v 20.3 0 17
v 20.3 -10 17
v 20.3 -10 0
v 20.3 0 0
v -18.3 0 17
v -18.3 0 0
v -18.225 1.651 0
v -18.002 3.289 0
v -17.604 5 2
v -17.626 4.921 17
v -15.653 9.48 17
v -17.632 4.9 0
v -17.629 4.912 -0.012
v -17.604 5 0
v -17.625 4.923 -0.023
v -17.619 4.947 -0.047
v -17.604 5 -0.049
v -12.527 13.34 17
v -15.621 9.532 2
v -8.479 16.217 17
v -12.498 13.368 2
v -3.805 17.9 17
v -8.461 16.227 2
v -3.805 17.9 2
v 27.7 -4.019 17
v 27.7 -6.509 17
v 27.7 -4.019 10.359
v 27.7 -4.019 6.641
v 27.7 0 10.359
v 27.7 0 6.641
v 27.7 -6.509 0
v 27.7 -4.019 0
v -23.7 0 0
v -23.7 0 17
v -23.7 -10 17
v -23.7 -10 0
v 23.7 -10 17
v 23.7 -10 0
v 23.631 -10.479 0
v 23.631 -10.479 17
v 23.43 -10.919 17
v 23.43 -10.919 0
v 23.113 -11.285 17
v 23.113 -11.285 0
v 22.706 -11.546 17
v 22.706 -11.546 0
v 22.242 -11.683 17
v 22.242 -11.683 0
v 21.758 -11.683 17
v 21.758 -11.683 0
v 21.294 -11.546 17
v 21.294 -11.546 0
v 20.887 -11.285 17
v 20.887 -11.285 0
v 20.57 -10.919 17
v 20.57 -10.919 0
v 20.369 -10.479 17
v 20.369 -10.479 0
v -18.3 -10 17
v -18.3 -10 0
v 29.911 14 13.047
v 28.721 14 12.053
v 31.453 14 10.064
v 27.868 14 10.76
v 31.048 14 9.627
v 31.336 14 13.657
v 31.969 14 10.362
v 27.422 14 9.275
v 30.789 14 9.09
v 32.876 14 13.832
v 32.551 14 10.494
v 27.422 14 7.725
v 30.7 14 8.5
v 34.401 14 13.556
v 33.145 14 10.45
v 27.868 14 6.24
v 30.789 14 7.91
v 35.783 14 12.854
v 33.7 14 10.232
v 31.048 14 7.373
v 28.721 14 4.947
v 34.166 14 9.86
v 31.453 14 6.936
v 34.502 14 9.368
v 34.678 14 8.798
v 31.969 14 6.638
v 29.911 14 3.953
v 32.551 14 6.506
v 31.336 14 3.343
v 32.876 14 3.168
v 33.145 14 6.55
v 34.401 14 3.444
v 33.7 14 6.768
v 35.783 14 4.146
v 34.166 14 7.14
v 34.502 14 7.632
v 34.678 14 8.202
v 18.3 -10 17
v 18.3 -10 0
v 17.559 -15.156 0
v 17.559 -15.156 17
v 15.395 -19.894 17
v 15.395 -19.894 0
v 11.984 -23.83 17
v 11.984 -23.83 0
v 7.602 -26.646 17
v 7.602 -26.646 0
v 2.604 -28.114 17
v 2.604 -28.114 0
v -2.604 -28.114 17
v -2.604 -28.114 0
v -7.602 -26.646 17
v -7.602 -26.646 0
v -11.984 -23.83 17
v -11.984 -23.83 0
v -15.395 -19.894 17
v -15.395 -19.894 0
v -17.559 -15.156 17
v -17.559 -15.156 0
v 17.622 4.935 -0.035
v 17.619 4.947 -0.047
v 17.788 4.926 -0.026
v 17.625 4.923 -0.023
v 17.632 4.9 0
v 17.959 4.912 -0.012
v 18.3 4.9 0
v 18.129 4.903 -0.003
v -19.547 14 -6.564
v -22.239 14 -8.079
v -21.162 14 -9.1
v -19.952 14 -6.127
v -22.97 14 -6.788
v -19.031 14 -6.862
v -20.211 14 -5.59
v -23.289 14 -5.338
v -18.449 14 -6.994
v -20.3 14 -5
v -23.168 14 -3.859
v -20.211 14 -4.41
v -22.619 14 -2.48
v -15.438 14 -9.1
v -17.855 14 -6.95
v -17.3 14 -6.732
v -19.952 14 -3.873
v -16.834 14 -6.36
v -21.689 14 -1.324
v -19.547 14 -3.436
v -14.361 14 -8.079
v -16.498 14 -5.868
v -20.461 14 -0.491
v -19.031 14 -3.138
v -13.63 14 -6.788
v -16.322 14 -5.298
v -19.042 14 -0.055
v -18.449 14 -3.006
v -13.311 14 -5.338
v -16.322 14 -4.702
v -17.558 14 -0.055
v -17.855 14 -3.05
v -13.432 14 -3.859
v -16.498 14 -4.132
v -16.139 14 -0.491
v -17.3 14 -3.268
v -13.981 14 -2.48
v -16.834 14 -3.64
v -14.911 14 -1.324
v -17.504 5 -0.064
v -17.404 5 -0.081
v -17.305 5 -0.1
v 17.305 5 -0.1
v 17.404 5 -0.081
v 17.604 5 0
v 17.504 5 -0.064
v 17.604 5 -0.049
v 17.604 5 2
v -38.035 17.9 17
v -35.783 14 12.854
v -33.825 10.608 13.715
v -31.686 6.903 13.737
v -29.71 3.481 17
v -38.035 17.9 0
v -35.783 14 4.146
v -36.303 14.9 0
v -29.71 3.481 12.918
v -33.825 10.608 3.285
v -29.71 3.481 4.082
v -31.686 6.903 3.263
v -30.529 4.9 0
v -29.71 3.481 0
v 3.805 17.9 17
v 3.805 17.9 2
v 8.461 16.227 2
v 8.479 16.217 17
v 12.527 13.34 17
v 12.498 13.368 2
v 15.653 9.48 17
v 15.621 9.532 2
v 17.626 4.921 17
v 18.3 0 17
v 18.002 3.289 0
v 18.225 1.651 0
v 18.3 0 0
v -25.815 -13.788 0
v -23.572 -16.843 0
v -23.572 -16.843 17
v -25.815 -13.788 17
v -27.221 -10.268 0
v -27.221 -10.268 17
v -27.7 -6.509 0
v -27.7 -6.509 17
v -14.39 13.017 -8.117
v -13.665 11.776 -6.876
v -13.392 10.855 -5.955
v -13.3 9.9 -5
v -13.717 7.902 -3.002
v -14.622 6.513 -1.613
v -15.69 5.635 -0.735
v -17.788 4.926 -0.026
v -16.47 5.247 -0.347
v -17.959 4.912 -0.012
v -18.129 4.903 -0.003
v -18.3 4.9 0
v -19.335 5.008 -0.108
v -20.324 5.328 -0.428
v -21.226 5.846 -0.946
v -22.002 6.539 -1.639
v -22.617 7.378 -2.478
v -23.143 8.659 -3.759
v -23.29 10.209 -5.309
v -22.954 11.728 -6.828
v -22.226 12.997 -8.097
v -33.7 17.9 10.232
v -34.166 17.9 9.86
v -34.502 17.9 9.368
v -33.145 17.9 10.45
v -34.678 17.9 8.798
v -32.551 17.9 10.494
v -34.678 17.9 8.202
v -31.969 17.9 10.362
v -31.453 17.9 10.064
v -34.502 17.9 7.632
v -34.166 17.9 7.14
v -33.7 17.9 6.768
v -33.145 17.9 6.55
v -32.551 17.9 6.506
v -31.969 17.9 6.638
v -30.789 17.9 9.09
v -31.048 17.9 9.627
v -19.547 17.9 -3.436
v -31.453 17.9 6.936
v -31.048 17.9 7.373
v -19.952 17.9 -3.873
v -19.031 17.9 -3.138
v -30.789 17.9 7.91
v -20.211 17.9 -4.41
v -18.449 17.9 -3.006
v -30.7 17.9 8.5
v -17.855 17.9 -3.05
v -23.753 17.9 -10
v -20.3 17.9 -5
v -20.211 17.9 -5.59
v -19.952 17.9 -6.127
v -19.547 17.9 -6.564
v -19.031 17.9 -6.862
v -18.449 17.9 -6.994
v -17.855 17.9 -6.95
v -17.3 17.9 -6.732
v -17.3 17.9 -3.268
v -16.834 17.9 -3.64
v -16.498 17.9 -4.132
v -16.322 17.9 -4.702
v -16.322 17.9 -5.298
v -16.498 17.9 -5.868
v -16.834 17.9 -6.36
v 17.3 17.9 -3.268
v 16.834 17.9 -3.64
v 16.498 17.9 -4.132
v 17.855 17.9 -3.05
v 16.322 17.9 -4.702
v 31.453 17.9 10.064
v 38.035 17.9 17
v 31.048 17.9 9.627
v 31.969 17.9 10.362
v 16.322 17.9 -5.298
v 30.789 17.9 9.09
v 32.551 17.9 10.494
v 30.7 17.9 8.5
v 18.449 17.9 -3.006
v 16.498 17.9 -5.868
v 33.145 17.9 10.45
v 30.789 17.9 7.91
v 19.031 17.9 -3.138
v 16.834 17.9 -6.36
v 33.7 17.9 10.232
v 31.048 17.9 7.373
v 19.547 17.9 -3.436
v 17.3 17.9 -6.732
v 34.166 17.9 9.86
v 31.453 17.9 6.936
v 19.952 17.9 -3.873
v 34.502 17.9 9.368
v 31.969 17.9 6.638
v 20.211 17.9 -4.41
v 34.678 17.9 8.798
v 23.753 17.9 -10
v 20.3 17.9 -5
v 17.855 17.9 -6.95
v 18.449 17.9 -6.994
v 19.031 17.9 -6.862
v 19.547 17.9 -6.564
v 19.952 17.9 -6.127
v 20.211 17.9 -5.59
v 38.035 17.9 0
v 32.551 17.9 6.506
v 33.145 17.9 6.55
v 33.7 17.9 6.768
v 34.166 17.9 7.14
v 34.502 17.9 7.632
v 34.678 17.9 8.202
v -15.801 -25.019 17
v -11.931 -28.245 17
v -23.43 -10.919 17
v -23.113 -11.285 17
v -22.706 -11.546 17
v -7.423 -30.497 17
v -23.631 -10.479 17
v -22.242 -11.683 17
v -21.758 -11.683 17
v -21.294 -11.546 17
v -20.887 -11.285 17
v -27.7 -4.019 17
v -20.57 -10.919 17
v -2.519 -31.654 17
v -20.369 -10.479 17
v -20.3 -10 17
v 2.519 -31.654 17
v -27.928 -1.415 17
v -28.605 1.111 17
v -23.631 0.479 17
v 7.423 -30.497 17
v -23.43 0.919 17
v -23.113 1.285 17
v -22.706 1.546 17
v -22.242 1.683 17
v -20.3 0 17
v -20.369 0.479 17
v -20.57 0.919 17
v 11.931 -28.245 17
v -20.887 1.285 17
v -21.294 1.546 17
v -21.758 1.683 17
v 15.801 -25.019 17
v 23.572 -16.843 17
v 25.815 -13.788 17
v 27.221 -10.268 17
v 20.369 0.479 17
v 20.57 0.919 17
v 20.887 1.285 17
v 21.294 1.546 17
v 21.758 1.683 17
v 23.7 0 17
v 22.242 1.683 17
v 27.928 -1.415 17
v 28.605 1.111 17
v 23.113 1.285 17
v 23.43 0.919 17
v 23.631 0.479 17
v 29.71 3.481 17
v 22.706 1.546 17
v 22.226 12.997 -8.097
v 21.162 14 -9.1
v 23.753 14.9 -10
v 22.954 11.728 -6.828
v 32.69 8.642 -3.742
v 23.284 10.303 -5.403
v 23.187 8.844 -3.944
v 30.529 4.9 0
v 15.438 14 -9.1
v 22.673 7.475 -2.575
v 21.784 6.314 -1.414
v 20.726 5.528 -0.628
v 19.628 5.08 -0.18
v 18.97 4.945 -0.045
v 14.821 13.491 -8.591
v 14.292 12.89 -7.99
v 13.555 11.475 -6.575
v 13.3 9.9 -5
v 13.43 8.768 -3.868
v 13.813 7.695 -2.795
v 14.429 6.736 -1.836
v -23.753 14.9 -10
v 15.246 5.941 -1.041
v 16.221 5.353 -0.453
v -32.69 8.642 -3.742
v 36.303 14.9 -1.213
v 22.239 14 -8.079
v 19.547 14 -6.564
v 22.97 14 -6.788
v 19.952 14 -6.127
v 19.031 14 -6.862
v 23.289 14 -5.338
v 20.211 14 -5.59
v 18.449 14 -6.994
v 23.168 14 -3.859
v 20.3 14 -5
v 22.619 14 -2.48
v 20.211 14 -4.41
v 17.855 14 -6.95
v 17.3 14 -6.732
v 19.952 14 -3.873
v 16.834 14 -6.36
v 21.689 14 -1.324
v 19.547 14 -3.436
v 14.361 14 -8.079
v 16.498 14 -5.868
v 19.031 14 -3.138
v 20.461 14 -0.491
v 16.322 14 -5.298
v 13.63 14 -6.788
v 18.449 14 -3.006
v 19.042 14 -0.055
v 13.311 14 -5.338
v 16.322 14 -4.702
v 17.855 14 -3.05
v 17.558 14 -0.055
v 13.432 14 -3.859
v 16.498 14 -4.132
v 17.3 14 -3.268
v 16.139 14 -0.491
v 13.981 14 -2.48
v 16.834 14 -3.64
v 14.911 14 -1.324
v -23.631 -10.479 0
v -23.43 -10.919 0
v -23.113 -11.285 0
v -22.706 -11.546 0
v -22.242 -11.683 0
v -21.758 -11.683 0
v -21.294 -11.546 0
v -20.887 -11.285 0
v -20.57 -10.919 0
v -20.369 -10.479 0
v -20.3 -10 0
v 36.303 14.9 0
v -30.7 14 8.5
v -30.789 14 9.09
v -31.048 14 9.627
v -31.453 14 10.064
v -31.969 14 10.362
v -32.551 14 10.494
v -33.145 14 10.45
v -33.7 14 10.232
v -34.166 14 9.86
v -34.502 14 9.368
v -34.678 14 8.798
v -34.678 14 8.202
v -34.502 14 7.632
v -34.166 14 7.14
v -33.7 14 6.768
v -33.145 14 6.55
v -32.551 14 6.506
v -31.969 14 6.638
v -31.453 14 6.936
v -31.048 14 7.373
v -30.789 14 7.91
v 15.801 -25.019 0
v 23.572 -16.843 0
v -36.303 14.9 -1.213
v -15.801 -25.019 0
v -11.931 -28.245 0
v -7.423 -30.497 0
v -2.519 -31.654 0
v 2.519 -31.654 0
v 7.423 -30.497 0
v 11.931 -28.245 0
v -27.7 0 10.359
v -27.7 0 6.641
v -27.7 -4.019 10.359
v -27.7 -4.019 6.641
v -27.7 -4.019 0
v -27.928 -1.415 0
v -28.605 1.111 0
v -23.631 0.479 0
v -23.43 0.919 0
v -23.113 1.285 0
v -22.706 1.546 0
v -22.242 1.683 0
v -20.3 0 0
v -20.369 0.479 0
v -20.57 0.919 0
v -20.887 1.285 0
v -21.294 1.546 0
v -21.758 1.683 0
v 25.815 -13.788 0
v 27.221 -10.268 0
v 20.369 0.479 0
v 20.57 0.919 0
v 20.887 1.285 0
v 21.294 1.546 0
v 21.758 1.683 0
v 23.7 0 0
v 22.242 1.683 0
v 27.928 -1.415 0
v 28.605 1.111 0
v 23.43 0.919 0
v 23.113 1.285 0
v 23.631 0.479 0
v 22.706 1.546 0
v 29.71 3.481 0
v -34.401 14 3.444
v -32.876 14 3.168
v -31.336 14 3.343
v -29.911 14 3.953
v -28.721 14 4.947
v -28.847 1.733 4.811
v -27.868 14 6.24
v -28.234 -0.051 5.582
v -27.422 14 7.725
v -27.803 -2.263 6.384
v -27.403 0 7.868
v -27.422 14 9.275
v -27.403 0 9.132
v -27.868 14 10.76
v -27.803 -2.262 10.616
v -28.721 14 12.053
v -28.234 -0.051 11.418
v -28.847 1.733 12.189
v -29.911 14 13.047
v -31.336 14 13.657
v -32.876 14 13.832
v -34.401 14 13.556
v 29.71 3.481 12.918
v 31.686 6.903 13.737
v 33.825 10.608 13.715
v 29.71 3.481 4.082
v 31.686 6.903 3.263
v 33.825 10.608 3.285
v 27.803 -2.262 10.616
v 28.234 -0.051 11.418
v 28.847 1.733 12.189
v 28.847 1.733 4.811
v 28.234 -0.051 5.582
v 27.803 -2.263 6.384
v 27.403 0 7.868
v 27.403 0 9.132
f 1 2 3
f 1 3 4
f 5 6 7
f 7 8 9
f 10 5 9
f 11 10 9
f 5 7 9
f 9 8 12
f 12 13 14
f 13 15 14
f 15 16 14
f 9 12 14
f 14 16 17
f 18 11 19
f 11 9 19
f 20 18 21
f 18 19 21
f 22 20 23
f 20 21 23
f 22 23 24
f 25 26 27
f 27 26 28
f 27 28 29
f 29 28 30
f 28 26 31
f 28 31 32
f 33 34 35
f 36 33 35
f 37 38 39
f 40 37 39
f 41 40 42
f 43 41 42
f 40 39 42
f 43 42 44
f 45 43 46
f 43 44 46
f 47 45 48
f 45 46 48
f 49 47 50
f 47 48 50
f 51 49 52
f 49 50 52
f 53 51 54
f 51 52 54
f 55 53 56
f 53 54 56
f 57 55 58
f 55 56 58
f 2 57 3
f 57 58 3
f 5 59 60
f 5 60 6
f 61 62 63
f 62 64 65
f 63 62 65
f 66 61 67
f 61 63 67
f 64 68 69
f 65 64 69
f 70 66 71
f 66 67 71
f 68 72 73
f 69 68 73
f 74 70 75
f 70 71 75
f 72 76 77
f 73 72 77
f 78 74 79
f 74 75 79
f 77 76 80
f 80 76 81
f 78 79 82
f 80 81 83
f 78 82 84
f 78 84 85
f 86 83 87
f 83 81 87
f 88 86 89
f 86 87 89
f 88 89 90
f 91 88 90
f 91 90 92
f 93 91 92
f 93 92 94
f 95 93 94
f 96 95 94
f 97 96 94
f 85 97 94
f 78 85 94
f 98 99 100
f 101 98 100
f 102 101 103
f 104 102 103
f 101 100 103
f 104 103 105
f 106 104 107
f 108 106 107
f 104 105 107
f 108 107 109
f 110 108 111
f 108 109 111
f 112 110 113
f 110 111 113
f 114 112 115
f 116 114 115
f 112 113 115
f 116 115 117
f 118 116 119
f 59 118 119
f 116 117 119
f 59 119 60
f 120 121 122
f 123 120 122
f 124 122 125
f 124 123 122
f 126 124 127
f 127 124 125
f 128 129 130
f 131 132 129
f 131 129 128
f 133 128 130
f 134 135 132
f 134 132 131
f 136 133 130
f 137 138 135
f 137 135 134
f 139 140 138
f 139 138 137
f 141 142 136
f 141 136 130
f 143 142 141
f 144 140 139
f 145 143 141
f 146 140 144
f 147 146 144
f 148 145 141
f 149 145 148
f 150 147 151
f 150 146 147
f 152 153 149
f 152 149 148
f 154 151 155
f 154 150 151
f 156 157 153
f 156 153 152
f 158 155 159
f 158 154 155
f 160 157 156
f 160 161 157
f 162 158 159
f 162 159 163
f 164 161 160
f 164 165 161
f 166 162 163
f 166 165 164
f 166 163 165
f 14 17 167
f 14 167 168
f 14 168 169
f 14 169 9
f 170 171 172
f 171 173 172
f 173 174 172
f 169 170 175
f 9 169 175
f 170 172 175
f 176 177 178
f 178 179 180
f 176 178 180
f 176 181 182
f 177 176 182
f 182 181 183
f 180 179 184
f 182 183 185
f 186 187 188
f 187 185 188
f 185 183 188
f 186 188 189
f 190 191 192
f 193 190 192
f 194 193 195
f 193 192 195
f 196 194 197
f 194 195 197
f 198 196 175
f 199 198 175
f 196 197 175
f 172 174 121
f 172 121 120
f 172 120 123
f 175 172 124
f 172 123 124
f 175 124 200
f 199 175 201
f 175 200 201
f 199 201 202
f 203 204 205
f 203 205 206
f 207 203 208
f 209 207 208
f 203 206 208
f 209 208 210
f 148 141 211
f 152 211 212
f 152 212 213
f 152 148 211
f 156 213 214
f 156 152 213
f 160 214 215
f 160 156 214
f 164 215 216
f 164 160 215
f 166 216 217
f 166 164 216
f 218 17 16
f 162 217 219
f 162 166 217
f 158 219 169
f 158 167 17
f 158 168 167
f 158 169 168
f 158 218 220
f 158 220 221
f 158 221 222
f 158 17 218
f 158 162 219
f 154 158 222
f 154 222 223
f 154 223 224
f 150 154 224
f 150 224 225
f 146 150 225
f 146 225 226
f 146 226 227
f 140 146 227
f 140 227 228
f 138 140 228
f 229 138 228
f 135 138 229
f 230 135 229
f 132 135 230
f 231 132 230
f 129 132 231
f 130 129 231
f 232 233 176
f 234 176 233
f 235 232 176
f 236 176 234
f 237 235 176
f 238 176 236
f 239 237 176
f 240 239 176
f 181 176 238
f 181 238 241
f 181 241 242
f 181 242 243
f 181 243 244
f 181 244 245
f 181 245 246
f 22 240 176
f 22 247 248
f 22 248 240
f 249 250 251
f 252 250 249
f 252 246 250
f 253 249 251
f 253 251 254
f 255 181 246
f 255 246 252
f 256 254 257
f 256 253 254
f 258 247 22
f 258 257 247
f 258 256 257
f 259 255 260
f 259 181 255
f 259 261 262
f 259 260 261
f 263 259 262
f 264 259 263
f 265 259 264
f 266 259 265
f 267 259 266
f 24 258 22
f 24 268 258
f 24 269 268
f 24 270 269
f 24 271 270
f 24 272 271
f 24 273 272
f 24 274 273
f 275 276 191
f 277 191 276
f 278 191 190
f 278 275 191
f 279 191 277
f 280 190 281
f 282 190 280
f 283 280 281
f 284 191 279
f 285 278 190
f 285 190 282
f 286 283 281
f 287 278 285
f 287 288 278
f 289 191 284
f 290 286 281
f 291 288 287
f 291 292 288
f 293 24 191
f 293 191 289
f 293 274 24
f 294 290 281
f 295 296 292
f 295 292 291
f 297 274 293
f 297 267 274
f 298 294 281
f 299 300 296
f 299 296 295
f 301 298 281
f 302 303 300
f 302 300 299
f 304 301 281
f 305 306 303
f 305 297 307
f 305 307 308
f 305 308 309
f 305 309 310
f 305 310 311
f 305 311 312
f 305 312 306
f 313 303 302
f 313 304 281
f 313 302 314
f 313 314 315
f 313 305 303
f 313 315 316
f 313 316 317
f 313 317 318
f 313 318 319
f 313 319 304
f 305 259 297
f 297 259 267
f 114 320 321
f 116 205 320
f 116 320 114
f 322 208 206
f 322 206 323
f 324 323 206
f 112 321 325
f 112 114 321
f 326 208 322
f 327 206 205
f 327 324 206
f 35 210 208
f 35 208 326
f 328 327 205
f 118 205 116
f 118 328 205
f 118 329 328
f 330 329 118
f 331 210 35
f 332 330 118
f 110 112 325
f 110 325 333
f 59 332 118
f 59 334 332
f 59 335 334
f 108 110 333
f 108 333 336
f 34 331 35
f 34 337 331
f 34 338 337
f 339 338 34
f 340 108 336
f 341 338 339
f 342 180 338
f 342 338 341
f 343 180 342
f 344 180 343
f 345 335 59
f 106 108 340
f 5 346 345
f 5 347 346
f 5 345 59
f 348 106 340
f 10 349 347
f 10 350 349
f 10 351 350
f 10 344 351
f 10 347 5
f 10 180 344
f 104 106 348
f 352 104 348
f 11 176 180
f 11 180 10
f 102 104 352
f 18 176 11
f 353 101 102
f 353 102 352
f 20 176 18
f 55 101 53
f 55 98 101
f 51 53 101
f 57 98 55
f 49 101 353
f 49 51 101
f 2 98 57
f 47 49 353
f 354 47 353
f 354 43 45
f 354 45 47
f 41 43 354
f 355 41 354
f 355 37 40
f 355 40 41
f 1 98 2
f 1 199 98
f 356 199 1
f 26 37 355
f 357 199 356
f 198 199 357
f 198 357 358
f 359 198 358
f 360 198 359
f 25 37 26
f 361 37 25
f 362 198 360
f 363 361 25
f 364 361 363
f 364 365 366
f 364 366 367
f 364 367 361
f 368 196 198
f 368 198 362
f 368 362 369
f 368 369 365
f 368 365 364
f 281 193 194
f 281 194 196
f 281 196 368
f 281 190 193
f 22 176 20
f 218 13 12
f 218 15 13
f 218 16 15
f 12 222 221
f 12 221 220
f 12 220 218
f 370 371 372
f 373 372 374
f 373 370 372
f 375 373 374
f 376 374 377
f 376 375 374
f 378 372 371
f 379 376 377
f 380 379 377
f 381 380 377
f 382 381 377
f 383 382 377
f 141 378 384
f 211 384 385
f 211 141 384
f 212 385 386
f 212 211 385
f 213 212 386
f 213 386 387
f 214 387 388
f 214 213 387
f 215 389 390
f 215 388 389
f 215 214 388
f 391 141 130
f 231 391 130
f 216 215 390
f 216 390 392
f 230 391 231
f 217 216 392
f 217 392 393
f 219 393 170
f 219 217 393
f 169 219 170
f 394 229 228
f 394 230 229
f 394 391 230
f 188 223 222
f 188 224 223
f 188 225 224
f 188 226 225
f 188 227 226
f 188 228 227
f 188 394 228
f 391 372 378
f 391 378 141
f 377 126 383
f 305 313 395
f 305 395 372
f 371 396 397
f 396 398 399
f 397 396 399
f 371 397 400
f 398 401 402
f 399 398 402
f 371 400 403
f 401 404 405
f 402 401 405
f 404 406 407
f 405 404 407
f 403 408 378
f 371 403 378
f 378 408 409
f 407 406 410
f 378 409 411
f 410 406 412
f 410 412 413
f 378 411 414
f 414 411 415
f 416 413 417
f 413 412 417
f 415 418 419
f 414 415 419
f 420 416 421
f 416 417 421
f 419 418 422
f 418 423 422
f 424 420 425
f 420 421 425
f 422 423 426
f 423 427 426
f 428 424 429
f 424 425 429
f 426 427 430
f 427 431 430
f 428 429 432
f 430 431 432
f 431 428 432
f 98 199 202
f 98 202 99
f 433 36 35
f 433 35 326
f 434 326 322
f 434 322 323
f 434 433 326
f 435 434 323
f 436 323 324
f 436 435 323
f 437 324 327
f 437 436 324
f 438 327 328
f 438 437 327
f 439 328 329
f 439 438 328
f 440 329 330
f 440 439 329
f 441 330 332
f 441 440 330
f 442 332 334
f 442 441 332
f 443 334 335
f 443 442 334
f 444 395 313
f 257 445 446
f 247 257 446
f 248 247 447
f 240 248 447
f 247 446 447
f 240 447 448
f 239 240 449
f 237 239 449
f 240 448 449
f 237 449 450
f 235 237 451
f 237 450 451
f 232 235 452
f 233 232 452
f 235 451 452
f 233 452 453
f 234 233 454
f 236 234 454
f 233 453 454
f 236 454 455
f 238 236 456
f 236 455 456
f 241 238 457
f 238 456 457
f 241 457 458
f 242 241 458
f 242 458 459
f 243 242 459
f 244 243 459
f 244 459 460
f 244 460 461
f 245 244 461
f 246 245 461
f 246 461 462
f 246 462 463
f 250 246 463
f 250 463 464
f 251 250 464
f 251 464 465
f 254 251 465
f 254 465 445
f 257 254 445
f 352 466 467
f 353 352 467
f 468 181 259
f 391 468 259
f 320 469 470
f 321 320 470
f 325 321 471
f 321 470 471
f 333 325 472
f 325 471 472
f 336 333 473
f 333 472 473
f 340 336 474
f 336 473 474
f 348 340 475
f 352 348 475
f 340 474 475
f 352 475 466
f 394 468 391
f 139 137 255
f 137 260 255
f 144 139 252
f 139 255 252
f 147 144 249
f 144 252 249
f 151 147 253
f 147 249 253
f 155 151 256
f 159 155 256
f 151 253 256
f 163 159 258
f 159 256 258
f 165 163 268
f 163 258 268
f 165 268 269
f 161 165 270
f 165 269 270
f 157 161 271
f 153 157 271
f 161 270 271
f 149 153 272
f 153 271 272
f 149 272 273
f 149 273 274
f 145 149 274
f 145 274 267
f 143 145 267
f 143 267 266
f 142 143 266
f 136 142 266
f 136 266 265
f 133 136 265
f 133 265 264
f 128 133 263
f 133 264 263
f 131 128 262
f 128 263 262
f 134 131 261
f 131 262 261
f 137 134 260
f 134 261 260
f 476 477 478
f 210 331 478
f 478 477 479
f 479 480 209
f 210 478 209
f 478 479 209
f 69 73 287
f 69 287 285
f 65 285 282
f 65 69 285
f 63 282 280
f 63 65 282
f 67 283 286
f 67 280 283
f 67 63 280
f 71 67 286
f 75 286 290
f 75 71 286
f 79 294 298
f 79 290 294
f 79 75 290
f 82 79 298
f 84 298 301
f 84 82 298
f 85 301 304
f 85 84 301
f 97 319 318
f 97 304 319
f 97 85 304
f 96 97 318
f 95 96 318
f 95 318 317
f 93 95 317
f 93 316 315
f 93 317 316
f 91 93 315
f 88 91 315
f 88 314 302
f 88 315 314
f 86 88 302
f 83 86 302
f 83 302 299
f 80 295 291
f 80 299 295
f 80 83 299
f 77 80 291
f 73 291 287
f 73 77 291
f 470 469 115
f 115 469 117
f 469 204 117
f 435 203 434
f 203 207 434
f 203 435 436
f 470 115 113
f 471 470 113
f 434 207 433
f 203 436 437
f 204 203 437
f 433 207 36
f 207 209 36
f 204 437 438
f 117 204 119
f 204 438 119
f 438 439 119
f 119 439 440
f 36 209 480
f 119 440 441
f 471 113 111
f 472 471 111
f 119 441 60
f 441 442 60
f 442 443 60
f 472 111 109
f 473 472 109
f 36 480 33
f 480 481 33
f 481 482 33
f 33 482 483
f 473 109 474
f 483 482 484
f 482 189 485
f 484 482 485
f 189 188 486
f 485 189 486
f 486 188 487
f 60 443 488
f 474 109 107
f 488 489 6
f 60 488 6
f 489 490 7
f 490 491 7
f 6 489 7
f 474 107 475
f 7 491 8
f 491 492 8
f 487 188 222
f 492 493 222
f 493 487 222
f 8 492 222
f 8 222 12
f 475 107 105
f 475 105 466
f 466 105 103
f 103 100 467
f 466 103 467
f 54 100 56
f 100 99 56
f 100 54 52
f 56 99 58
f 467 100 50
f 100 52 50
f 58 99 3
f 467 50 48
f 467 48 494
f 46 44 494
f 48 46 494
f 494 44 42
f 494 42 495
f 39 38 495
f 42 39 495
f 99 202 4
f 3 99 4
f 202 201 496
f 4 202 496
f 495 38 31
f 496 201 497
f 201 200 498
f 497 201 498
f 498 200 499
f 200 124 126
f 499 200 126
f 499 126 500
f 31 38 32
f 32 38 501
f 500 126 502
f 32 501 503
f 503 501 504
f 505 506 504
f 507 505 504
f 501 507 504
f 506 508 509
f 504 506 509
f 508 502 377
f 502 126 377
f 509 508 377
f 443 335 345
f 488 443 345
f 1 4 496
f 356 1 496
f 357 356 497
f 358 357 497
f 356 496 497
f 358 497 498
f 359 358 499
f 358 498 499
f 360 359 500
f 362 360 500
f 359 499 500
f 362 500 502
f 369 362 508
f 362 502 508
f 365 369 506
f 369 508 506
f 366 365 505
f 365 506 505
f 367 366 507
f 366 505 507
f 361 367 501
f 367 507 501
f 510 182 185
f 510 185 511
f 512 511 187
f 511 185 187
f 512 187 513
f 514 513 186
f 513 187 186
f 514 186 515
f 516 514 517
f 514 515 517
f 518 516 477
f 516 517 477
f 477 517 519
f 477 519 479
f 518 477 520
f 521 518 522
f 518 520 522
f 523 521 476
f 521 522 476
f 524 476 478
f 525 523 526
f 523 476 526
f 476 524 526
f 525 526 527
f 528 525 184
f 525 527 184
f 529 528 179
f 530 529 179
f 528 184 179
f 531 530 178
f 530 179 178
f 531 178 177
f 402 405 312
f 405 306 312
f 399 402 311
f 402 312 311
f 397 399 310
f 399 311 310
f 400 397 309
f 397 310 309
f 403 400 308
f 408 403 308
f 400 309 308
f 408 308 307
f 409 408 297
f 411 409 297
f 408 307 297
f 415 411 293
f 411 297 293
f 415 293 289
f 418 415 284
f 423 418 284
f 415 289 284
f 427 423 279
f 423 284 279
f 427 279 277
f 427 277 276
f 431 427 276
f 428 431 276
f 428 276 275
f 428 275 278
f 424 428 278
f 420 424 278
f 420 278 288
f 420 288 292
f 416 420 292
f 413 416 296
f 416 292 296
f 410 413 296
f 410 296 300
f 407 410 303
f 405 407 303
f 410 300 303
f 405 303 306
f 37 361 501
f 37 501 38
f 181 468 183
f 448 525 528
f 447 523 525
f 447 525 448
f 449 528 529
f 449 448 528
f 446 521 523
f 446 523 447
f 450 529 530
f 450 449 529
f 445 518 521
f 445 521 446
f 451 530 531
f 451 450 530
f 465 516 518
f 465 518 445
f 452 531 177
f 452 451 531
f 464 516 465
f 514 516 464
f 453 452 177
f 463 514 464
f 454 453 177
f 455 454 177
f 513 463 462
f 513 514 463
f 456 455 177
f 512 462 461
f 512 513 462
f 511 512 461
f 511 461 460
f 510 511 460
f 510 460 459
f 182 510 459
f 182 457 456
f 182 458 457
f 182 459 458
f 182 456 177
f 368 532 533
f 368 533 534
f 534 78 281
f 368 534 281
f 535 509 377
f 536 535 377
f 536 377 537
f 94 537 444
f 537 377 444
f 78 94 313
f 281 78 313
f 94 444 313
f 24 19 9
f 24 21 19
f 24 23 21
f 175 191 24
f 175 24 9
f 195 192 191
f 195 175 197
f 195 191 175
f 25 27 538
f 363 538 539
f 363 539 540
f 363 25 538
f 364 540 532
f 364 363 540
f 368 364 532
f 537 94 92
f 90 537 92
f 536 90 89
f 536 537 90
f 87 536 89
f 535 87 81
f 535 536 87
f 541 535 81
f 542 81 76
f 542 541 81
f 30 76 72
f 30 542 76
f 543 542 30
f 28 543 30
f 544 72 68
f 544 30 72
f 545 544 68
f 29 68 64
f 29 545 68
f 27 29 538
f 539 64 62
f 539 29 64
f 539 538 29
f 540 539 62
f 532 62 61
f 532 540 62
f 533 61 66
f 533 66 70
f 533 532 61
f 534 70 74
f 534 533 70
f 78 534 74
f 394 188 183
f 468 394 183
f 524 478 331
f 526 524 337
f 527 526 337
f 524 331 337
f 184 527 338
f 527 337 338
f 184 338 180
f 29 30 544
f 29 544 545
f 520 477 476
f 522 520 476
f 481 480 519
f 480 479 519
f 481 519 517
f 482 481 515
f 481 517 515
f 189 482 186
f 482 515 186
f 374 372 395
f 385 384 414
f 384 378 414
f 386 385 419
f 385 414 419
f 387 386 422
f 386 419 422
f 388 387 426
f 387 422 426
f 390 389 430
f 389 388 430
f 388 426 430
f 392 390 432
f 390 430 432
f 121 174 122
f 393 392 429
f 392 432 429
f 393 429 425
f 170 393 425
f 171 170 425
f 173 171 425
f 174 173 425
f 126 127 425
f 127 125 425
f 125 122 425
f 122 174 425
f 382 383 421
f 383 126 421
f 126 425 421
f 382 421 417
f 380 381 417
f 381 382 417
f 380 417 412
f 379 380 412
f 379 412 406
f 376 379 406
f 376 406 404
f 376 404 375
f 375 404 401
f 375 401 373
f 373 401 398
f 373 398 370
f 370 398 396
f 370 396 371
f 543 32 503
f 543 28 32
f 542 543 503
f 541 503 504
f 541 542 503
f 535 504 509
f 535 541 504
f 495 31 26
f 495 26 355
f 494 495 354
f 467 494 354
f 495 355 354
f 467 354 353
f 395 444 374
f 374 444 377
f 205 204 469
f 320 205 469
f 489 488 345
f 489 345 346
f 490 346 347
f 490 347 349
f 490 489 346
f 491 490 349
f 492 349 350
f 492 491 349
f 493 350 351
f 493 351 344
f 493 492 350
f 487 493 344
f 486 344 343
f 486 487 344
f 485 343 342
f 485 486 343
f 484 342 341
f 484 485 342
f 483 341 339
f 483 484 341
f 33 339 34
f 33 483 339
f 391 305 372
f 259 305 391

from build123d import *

# Parameters (mm, degrees)
BOSS_EXTRUDE1_DEPTH = 17
BOSS_EXTRUDE2_START = -17
BOSS_EXTRUDE2_DEPTH = 2
SKETCH3_R           = 2
CUT_EXTRUDE2_DEPTH  = 53.410576235
SKETCH4_R           = 5.334569818
CUT_EXTRUDE3_DEPTH  = 14
SKETCH5_R           = 2
BOSS_EXTRUDE3_DEPTH = 3
CUT_EXTRUDE4_DEPTH  = 57.452356029
CHAMFER2_SIZE       = 10
FILLET1_R           = 15
FILLET2_R           = 15
SKETCH7_R           = 5
CUT_EXTRUDE6_DEPTH  = 62.913395196


with BuildPart() as part:
    # Sketch1 → Boss-Extrude1 (new body)
    with BuildSketch(Plane.XY):
        with BuildLine():
            Line((38.034569818, 17.9), (3.805259518, 17.9))
            ThreePointArc((3.805259518, 17.9), (14.221924082, 11.51637423), (18.3, 0))
            Line((18.3, 0), (18.3, -10))
            ThreePointArc((18.3, -10), (0, -28.3), (-18.3, -10))
            Line((-18.3, -10), (-18.3, 0))
            ThreePointArc((-18.3, 0), (-14.221924082, 11.51637423), (-3.805259518, 17.9))
            Line((-3.805259518, 17.9), (-38.034569818, 17.9))
            Line((-38.034569818, 17.9), (-27.7, 0))
            Line((-27.7, 0), (-27.7, -12.5))
            Line((-27.7, -12.5), (-15.801197979, -25.018726392))
            ThreePointArc((-15.801197979, -25.018726392), (0, -31.8), (15.801197979, -25.018726392))
            Line((15.801197979, -25.018726392), (27.7, -12.5))
            Line((27.7, -12.5), (27.7, 0))
            Line((27.7, 0), (38.034569818, 17.9))
        make_face()
        with BuildLine():
            Line((23.7, 0), (23.7, -10))
            ThreePointArc((23.7, -10), (22, -11.7), (20.3, -10))
            Line((20.3, -10), (20.3, 0))
            ThreePointArc((20.3, 0), (22, 1.7), (23.7, 0))
        make_face(mode=Mode.SUBTRACT)
        with BuildLine():
            Line((-23.7, 0), (-23.7, -10))
            ThreePointArc((-23.7, -10), (-22, -11.7), (-20.3, -10))
            Line((-20.3, -10), (-20.3, 0))
            ThreePointArc((-20.3, 0), (-22, 1.7), (-23.7, 0))
        make_face(mode=Mode.SUBTRACT)
    extrude(amount=BOSS_EXTRUDE1_DEPTH)

    # Sketch2 → Boss-Extrude2 (add)
    with BuildSketch(Plane.XY.offset(17).offset(BOSS_EXTRUDE2_START)):
        Polygon((38.034569818, 17.9), (-38.034569818, 17.9), (-30.586751346, 5), (30.586751346, 5), align=None)
    extrude(amount=BOSS_EXTRUDE2_DEPTH)

    # Sketch3 → Cut-Extrude2 (cut, through all)
    with BuildSketch(Plane(origin=(0, 0, 0), x_dir=(1, 0, 0), z_dir=(0, 1, 0))):
        with Locations(Location((32.7, -8.5, 0), (0, 0, 180))):
            Circle(SKETCH3_R)
    cut_extrude2 = extrude(amount=CUT_EXTRUDE2_DEPTH, mode=Mode.SUBTRACT)

    # Sketch4 → Cut-Extrude3 (cut)
    with BuildSketch(Plane(origin=(0, 0, 0), x_dir=(1, 0, 0), z_dir=(0, 1, 0))):
        with Locations((32.7, -8.5)):
            Circle(SKETCH4_R)
    cut_extrude3 = extrude(amount=CUT_EXTRUDE3_DEPTH, mode=Mode.SUBTRACT)

    # Sketch5 → Boss-Extrude3 (add)
    with BuildSketch(Plane(origin=(0, 17.9, 0), x_dir=(1, 0, 0), z_dir=(0, 1, 0))):
        Polygon((-38.034569818, 0), (-23.753089751, 10), (0, 10), (0, 0), align=None)
        with Locations(Location((-18.3, 5, 0), (0, 0, 180))):
            Circle(SKETCH5_R, mode=Mode.SUBTRACT)
    boss_extrude3 = extrude(amount=-BOSS_EXTRUDE3_DEPTH)

    # Sketch6 → Cut-Extrude4 (cut, through all)
    with BuildSketch(Plane(origin=(0, 0, -10), x_dir=(-1, 0, 0), z_dir=(0, 0, -1))):
        Polygon((36.302519011, 14.9), (38.034569818, 17.9), (38.034569818, 14.9), align=None)
    cut_extrude4 = extrude(amount=-CUT_EXTRUDE4_DEPTH, mode=Mode.SUBTRACT)

    # Mirror2: Cut-Extrude2, Cut-Extrude3, Boss-Extrude3 across plane
    add(cut_extrude2.mirror(Plane(origin=(0, 14.9, -10), x_dir=(0, 0, 1), z_dir=(1, 0, 0))), mode=Mode.SUBTRACT)
    add(cut_extrude3.mirror(Plane(origin=(0, 14.9, -10), x_dir=(0, 0, 1), z_dir=(1, 0, 0))), mode=Mode.SUBTRACT)
    add(boss_extrude3.mirror(Plane(origin=(0, 14.9, -10), x_dir=(0, 0, 1), z_dir=(1, 0, 0))))

    # Mirror3: Cut-Extrude2, Cut-Extrude3, Cut-Extrude4 across plane
    add(cut_extrude2.mirror(Plane(origin=(0, 0, 0), x_dir=(0, 0, 1), z_dir=(1, 0, 0))), mode=Mode.SUBTRACT)
    add(cut_extrude3.mirror(Plane(origin=(0, 0, 0), x_dir=(0, 0, 1), z_dir=(1, 0, 0))), mode=Mode.SUBTRACT)
    add(cut_extrude4.mirror(Plane(origin=(0, 0, 0), x_dir=(0, 0, 1), z_dir=(1, 0, 0))), mode=Mode.SUBTRACT)

    # Chamfer2
    # the kernel refuses this chamfer: 10 mm, written as the material it adds along each edge
    with BuildSketch(Plane(origin=(-62.019348891, 14.9, 0), x_dir=(0, 0.027495876610586317, -0.9996219169112968), z_dir=(1, 0, 0))) as chamfer2_piece_1_section:
        Polygon((CHAMFER2_SIZE * 0.999621916911, -CHAMFER2_SIZE * 0.0274958766106), (-CHAMFER2_SIZE * 0.0274958766106, -CHAMFER2_SIZE * 0.999621916911), (0, 0), align=None)
    chamfer2_piece_1 = extrude(amount=124.038697781, mode=Mode.PRIVATE)
    chamfer2_piece_1 = chamfer2_piece_1 - Plane(origin=(18.3, 11.716008288, -5), x_dir=(1, 0, 0), z_dir=(0, 1, 0)) * Cylinder(2, 289, mode=Mode.PRIVATE)
    chamfer2_piece_1 = chamfer2_piece_1 - Plane(origin=(-18.3, 11.716008288, -5), x_dir=(-1, 0, 0), z_dir=(0, 1, 0)) * Cylinder(2, 289, mode=Mode.PRIVATE)
    chamfer2_piece_1 = split(chamfer2_piece_1, bisect_by=Plane(origin=(-4.622195202, 11.716008288, -29.868588423), z_dir=(-0.5735764363510418, 0, 0.819152044288995)), keep=Keep.TOP, mode=Mode.PRIVATE)
    chamfer2_piece_1 = split(chamfer2_piece_1, bisect_by=Plane(origin=(-26.779856727, 11.716008288, -7.880634947), z_dir=(0.5735764363510418, 0, 0.819152044288995)), keep=Keep.TOP, mode=Mode.PRIVATE)
    chamfer2_piece_1 = split(chamfer2_piece_1, bisect_by=Plane(origin=(-31.697953242, 6.924658142, -3.052401614), z_dir=(0.8660254037844364, 0.500000000000004, 0)), keep=Keep.TOP, mode=Mode.PRIVATE)
    chamfer2_piece_1 = chamfer2_piece_1 - Plane(origin=(0, 0, -3.052401614), x_dir=(-1, 0, 0), z_dir=(0, 0, -1)) * Cylinder(18.3, 289, mode=Mode.PRIVATE)
    chamfer2_piece_1 = split(chamfer2_piece_1, bisect_by=Plane(origin=(19.998407566, -13.339549394, -3.052401614), z_dir=(-0.8660254037844365, 0.5000000000000038, 0)), keep=Keep.TOP, mode=Mode.PRIVATE)
    add(chamfer2_piece_1)
    with BuildSketch(Plane(origin=(-62.019348891, 14.9, 0), x_dir=(0, 0.027495876610586317, -0.9996219169112968), z_dir=(1, 0, 0))) as chamfer2_piece_2_section:
        Polygon((CHAMFER2_SIZE * 0.999621916911, -CHAMFER2_SIZE * 0.0274958766106), (-CHAMFER2_SIZE * 0.0274958766106, -CHAMFER2_SIZE * 0.999621916911), (0, 0), align=None)
    chamfer2_piece_2 = extrude(amount=124.038697781, mode=Mode.PRIVATE)
    chamfer2_piece_2 = split(chamfer2_piece_2, bisect_by=Plane(origin=(0, 5, -3.178355845), z_dir=(0, 1, 0)), keep=Keep.TOP, mode=Mode.PRIVATE)
    chamfer2_piece_2 = chamfer2_piece_2 & Plane(origin=(0, 0, -3.178355845), x_dir=(-1, 0, 0), z_dir=(0, 0, -1)) * Cylinder(18.3, 289, mode=Mode.PRIVATE)
    add(chamfer2_piece_2)

    # Fillet1
    fillet1_edges = [part.edges().sort_by_distance(p)[0] for p in [
        (27.7, -12.5, 8.5),
        (-27.7, -12.5, 8.5),
    ]]
    fillet(fillet1_edges, radius=FILLET1_R)

    # Fillet2
    fillet2_edges = [part.edges().sort_by_distance(p)[0] for p in [
        (27.7, 0, 13.67973587),
        (27.7, 0, 3.32026413),
        (-27.7, 0, 13.67973587),
        (-27.7, 0, 3.32026413),
    ]]
    fillet(fillet2_edges, radius=FILLET2_R)

    # Sketch7 → Cut-Extrude6 (cut, through all)
    with BuildSketch(Plane.XZ.offset(-14)):
        with Locations((-18.3, -5)):
            Circle(SKETCH7_R)
    cut_extrude6 = extrude(amount=CUT_EXTRUDE6_DEPTH, mode=Mode.SUBTRACT)

    # Mirror4: Cut-Extrude6 across plane
    add(cut_extrude6.mirror(Plane(origin=(0, 0, 0), x_dir=(0, 0, 1), z_dir=(1, 0, 0))), mode=Mode.SUBTRACT)


solid = part.part
